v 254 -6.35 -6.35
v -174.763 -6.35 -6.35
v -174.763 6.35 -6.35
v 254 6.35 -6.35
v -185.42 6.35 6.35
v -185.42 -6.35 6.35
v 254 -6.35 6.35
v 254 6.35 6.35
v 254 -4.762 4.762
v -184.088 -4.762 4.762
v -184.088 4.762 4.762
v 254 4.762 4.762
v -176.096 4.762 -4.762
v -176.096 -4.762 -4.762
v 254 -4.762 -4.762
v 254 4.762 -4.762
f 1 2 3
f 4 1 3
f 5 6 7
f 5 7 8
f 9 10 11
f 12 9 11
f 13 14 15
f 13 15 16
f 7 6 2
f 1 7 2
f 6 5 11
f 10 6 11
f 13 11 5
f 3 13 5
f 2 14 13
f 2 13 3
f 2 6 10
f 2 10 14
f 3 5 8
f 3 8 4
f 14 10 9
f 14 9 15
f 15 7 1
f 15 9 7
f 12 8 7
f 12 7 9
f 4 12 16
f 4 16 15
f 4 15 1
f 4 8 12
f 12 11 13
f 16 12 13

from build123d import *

# Parameters (mm, degrees)
BOSS_EXTRUDE1_DEPTH      = 254
BOSS_EXTRUDE1_DEPTH_BACK = 185.42
SKETCH1_W                = 12.7
SKETCH1_H                = 12.7
SKETCH1_W_2              = 9.525
SKETCH1_H_2              = 9.525
CUT_EXTRUDE1_DEPTH       = 255.158700422
CUT_EXTRUDE1_DEPTH_BACK  = 255.158700422


with BuildPart() as part:
    # Sketch1 → Boss-Extrude1 (new, two sides: drawn at the far end of the back side and taken through both)
    with BuildSketch(Plane(origin=(0, 0, 0), x_dir=(0, 0, -1), z_dir=(1, 0, 0)).offset(-BOSS_EXTRUDE1_DEPTH_BACK)):
        Rectangle(SKETCH1_W, SKETCH1_H)
        Rectangle(SKETCH1_W_2, SKETCH1_H_2, mode=Mode.SUBTRACT)
    extrude(amount=BOSS_EXTRUDE1_DEPTH + BOSS_EXTRUDE1_DEPTH_BACK)

    # Sketch2 → Cut-Extrude1 (cut, two sides: drawn at the far end of the back side and taken through both)
    with BuildSketch(Plane(origin=(0, 0, 0), x_dir=(1, 0, 0), z_dir=(0, 1, 0)).offset(-CUT_EXTRUDE1_DEPTH_BACK)):
        Polygon((-185.42, -6.35), (-174.250456919, 6.961343094), (-183.078216502, 14.368712905), (-194.247759583, 1.057369811), align=None)
    extrude(amount=CUT_EXTRUDE1_DEPTH + CUT_EXTRUDE1_DEPTH_BACK, mode=Mode.SUBTRACT)


solid = part.part
